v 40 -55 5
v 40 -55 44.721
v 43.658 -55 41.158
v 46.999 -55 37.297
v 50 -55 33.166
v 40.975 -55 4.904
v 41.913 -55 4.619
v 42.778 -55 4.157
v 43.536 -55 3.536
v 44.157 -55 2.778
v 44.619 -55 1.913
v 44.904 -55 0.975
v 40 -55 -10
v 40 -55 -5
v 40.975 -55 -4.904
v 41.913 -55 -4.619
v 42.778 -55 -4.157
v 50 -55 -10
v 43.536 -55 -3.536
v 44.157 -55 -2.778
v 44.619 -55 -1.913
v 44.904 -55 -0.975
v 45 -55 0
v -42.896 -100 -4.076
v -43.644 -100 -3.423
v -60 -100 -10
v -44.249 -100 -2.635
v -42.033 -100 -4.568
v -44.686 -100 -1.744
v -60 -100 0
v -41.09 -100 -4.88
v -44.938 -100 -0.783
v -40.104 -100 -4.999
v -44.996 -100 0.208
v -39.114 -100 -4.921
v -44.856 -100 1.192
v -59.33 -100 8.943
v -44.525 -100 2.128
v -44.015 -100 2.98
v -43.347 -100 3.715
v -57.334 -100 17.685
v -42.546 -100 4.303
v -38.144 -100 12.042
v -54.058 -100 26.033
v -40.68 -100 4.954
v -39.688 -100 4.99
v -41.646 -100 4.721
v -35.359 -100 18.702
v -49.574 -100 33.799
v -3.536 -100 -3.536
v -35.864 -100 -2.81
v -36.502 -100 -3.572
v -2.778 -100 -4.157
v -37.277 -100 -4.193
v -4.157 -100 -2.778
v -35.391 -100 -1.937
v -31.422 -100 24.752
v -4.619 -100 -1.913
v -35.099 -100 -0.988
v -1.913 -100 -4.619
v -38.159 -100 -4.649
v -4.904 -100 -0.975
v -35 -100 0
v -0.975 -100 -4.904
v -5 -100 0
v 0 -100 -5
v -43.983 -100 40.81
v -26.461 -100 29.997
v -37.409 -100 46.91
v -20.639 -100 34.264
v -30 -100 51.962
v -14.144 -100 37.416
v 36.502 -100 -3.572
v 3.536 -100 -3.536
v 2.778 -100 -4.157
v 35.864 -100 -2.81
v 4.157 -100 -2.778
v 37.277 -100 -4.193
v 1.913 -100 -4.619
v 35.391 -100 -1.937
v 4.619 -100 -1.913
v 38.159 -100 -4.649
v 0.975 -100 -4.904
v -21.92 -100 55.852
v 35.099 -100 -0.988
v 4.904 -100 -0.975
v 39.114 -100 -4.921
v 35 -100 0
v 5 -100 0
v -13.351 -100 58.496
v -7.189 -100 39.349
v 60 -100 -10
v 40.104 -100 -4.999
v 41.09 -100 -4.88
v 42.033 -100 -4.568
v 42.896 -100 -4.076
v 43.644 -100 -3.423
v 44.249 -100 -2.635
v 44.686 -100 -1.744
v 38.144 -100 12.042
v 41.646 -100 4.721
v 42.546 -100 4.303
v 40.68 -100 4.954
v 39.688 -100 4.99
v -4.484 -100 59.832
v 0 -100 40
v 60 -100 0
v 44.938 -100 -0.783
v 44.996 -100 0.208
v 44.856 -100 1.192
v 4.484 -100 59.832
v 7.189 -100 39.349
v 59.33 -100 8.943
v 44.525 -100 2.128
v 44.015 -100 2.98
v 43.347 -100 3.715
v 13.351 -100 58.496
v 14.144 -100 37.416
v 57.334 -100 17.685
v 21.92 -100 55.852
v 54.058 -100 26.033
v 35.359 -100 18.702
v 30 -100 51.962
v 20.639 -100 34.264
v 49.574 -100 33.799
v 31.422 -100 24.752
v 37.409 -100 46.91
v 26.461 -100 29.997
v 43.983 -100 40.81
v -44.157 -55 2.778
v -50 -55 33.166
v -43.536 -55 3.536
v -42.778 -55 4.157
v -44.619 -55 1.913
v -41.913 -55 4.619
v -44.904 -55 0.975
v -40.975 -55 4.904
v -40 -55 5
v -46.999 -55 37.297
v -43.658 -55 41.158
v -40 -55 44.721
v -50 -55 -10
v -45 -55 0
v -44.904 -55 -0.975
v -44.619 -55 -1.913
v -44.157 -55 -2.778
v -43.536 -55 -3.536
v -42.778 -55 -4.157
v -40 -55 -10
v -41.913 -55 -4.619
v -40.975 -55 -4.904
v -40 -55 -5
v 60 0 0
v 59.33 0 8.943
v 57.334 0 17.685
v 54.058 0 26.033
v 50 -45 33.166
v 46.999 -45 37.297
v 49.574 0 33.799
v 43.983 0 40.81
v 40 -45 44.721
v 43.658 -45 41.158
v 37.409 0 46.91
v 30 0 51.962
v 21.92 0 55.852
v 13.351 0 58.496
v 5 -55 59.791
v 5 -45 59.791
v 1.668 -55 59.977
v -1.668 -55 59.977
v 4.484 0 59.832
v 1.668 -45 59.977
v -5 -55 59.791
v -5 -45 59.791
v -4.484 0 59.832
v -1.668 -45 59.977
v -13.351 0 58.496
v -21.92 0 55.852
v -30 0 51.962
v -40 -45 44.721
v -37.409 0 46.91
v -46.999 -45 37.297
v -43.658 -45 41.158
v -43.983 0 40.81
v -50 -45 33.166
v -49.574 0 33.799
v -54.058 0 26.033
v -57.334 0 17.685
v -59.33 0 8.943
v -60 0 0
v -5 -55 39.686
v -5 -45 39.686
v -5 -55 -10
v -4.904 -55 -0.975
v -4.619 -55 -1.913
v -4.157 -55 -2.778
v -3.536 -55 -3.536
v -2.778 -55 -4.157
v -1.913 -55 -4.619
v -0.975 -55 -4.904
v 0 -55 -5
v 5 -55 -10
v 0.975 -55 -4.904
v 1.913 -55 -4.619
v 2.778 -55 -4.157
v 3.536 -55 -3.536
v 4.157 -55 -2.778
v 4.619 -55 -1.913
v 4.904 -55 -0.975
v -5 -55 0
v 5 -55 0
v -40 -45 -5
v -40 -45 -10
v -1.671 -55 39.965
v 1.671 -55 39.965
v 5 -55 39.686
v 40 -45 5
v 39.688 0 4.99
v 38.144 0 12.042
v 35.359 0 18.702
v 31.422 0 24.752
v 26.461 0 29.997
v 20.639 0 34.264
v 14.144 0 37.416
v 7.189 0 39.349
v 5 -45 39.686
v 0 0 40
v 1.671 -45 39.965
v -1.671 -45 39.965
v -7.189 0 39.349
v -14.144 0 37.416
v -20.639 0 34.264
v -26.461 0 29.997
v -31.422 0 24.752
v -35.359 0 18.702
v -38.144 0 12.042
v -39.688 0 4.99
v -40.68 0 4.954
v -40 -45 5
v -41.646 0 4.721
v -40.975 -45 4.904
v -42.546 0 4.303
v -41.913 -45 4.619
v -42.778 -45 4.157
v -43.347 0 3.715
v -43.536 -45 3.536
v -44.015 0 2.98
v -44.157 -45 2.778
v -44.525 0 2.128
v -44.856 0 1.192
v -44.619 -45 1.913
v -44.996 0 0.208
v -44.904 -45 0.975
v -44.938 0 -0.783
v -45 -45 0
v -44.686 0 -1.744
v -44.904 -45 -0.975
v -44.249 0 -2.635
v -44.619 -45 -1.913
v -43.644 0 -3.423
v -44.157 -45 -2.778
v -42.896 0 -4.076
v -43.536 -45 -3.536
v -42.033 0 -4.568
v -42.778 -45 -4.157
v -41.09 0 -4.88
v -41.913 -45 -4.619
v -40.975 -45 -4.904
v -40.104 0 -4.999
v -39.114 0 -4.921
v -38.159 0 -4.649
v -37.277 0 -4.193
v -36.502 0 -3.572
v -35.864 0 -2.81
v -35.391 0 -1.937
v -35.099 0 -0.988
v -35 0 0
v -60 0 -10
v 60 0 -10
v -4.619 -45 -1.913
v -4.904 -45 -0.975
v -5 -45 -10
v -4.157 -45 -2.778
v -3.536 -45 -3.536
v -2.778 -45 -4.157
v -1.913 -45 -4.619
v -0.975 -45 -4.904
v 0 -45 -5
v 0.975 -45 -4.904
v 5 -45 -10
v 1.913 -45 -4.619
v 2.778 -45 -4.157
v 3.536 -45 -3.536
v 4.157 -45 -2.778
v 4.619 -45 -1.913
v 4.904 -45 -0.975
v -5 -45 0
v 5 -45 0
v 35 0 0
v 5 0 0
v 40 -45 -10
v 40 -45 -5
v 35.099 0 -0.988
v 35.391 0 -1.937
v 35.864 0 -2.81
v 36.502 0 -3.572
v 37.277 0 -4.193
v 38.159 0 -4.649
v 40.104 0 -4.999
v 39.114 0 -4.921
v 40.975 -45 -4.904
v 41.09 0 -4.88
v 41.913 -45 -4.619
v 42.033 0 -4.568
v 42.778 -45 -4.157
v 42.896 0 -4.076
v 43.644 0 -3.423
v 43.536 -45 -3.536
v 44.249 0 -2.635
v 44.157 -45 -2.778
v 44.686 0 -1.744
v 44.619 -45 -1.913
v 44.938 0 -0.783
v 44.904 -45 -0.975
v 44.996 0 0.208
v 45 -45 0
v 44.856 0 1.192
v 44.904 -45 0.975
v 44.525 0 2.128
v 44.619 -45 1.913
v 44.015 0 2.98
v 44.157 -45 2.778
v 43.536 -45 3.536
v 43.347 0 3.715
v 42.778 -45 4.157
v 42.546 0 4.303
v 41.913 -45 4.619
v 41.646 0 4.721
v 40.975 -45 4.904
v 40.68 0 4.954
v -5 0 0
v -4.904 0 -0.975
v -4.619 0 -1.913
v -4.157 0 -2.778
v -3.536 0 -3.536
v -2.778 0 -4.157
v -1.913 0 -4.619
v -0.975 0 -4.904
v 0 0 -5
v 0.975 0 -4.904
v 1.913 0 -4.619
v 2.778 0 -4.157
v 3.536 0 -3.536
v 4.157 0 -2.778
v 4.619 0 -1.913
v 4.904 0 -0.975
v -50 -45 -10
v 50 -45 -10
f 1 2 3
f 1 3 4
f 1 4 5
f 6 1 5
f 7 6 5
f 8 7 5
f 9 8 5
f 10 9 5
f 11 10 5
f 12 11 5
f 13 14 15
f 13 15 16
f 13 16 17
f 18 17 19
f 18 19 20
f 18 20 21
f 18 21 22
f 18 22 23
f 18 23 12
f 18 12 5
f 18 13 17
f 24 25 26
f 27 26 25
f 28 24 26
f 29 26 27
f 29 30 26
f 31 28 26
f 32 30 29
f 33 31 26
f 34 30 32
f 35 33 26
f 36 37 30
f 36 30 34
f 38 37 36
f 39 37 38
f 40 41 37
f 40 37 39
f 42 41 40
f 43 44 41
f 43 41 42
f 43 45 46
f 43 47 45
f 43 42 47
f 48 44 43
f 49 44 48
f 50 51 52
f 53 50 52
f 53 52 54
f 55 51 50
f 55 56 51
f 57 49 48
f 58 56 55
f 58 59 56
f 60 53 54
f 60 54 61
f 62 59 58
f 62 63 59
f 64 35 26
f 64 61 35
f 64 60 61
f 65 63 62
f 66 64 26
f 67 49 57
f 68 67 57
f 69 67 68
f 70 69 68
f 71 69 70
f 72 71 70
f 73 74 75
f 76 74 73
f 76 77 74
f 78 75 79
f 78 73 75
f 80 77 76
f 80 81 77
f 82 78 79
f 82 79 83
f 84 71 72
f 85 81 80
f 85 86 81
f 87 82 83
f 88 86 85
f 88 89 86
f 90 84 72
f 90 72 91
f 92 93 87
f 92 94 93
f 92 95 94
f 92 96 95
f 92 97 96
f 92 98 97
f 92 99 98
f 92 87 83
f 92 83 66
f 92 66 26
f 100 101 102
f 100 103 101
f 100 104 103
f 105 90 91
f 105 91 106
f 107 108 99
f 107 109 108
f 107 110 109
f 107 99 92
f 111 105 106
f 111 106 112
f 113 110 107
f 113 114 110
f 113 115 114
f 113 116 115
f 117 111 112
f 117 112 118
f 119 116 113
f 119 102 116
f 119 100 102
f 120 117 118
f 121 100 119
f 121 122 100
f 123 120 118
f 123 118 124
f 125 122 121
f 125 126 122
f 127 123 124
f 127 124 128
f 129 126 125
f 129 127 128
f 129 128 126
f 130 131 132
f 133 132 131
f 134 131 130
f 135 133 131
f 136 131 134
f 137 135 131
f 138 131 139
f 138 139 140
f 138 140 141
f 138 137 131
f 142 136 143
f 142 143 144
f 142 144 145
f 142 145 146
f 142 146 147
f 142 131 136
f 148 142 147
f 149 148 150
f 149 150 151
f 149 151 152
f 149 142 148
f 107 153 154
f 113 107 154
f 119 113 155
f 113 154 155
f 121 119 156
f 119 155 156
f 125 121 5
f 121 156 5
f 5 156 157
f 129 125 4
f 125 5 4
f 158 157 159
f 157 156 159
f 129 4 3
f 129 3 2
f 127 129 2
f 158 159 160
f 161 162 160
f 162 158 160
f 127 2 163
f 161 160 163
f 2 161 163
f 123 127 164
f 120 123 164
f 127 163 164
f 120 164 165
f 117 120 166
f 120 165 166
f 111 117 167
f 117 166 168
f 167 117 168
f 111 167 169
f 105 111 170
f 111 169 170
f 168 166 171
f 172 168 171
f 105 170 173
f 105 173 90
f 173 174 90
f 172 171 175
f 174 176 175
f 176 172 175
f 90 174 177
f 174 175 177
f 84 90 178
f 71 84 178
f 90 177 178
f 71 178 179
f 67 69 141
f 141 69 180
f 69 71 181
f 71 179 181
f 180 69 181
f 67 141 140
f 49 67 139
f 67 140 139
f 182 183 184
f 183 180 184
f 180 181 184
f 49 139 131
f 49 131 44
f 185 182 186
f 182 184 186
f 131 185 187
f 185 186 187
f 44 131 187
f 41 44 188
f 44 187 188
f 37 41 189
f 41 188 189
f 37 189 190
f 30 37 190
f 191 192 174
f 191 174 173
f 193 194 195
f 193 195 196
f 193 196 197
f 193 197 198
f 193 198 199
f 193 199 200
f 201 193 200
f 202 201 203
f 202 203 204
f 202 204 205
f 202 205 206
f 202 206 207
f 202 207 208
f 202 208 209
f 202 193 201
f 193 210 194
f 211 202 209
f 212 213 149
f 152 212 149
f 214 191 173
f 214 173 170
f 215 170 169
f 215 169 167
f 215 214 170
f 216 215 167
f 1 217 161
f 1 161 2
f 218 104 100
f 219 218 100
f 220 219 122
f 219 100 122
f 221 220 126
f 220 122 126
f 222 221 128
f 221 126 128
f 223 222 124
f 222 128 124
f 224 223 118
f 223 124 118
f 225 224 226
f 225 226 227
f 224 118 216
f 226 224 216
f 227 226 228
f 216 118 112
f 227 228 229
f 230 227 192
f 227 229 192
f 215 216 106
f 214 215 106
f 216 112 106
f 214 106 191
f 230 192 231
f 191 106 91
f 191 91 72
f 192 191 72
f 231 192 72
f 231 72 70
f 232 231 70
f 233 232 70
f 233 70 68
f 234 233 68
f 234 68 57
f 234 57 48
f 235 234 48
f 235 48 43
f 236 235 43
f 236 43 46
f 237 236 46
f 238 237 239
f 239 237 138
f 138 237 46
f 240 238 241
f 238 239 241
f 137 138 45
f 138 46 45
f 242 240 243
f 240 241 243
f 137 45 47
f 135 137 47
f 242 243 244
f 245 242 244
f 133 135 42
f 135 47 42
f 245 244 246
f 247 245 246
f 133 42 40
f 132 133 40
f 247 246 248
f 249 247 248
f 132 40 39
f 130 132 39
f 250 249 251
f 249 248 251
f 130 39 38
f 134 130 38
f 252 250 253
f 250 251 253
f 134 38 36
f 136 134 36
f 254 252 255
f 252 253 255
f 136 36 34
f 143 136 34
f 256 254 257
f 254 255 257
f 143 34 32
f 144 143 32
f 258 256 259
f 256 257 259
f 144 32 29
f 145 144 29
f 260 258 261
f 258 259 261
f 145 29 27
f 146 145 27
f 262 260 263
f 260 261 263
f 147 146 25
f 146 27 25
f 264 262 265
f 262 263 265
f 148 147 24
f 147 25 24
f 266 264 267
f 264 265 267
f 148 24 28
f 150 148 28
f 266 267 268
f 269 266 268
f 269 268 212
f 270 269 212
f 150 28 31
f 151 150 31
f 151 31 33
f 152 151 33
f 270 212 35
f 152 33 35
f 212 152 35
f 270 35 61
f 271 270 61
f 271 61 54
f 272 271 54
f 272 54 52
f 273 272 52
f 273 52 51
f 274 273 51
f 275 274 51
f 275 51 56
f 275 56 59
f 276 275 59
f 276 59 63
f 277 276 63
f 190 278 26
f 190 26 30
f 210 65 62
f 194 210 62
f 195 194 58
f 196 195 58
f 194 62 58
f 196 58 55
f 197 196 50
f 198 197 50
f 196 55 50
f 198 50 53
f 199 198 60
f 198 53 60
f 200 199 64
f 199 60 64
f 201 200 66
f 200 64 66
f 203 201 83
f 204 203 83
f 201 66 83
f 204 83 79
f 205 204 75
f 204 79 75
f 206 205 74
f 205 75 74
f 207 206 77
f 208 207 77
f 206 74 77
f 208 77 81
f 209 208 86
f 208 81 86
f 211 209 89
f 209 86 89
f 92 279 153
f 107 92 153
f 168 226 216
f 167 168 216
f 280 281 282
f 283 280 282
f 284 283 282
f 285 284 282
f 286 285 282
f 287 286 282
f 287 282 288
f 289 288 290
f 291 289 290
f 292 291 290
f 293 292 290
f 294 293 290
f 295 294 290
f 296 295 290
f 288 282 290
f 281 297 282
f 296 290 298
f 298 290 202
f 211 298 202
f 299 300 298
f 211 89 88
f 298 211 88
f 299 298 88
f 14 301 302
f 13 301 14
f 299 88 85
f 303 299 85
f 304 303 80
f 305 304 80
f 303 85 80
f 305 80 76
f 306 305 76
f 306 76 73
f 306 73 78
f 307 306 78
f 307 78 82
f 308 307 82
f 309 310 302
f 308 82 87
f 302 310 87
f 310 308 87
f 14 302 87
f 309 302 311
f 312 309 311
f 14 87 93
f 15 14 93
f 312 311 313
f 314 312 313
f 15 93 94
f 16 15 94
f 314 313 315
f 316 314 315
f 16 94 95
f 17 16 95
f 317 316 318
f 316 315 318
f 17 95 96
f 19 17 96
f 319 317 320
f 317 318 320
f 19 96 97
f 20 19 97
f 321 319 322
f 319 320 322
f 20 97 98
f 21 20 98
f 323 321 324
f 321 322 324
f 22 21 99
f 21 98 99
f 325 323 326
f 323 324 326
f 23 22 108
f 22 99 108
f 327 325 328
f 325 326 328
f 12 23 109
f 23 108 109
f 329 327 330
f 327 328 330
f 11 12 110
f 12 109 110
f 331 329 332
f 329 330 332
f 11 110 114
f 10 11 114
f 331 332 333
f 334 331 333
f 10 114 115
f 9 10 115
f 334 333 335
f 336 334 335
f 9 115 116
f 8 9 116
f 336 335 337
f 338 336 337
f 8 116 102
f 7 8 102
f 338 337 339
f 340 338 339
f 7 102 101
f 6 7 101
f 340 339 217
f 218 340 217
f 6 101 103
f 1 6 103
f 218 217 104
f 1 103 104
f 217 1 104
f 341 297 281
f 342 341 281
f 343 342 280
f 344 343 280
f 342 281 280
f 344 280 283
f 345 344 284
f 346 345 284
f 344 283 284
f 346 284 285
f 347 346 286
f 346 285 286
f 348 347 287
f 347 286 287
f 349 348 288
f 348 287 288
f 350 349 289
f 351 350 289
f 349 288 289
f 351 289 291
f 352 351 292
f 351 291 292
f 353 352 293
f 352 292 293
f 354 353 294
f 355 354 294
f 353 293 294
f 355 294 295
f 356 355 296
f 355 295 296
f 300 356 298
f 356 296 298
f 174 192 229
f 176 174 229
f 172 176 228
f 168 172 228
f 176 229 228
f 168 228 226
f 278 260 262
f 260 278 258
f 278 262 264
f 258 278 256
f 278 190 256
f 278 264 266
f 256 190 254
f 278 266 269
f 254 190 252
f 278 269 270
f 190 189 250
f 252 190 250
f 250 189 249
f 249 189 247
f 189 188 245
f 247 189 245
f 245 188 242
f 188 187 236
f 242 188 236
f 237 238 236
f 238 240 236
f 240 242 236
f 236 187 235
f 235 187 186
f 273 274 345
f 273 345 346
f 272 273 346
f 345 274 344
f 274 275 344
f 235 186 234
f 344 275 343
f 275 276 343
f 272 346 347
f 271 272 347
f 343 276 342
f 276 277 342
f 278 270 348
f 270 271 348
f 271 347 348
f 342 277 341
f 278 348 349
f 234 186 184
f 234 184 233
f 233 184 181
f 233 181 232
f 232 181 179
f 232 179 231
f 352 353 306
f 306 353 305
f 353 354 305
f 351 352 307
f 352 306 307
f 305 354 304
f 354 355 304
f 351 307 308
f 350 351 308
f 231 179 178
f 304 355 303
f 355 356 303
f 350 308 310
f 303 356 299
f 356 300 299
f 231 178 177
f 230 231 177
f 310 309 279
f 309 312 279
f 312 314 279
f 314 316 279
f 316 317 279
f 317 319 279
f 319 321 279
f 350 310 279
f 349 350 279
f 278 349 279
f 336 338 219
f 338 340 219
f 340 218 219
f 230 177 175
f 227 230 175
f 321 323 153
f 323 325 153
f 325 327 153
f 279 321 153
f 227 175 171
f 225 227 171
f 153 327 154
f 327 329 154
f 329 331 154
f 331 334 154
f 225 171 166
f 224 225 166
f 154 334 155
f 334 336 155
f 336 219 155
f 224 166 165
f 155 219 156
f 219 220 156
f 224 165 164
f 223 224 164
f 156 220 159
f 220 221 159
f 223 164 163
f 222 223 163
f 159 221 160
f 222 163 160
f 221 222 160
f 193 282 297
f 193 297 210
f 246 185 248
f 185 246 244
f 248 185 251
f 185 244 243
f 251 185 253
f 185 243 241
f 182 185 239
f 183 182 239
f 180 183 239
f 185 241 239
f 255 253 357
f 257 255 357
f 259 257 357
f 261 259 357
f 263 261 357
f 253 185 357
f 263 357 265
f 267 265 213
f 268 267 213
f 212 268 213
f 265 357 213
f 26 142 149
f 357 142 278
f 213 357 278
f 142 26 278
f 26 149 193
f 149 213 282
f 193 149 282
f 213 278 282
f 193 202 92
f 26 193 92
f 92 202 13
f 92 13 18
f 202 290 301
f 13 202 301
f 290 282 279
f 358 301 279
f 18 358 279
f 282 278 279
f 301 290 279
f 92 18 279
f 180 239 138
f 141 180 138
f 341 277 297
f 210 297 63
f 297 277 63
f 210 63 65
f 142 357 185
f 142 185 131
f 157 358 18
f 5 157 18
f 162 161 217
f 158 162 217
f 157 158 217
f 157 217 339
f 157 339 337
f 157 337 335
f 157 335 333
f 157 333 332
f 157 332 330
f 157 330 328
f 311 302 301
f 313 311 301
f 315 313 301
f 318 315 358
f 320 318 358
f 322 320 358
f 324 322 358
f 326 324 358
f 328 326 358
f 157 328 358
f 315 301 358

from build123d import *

# Parameters (mm, degrees)
F0_W     = 120
F0_H     = 10
F1_DEPTH = 100
F3_DEPTH = 100.001
F4_W     = 10
F4_H     = 10
F5_DEPTH = 70.001


with BuildPart() as f1:
    # F0 (on Front) → F1 (new body)
    with BuildSketch(Plane.XZ):
        with BuildLine():
            Line((-60, 0), (60, 0))
            ThreePointArc((60, 0), (0, 60), (-60, 0))
        make_face()
        with Locations((0, -5)):
            Rectangle(F0_W, F0_H)
    extrude(amount=F1_DEPTH)

    # F2 (on face) → F3 (cut, through all)
    with BuildSketch(Plane.XZ.offset(100)):
        with BuildLine():
            ThreePointArc((35, 0), (43.6443449343, -3.4232659844), (39.6875, 4.9902248196))
            ThreePointArc((39.6875, 4.9902248196), (0, 40), (-39.6875, 4.9902248196))
            ThreePointArc((-39.6875, 4.9902248196), (-43.6443449343, -3.4232659844), (-35, 0))
            Line((-35, 0), (-5, 0))
            ThreePointArc((-5, 0), (0, 5), (5, 0))
            Line((5, 0), (35, 0))
        make_face()
        with BuildLine():
            ThreePointArc((-5, 0), (0, -5), (5, 0))
            Line((5, 0), (-5, 0))
        make_face()
        with BuildLine():
            Line((-5, 0), (5, 0))
            ThreePointArc((5, 0), (0, 5), (-5, 0))
        make_face()
    extrude(amount=-F3_DEPTH, mode=Mode.SUBTRACT)

    # F4 (on face) → F5 (cut, through all)
    with BuildSketch(Plane(origin=(0, 0, -10), x_dir=(1, 0, 0), z_dir=(0, 0, -1))):
        with Locations((-45, 50)):
            Rectangle(F4_W, F4_H)
        with Locations((0, 50)):
            Rectangle(F4_W, F4_H)
        with Locations((45, 50)):
            Rectangle(F4_W, F4_H)
    extrude(amount=-F5_DEPTH, mode=Mode.SUBTRACT)


solid = f1.part
